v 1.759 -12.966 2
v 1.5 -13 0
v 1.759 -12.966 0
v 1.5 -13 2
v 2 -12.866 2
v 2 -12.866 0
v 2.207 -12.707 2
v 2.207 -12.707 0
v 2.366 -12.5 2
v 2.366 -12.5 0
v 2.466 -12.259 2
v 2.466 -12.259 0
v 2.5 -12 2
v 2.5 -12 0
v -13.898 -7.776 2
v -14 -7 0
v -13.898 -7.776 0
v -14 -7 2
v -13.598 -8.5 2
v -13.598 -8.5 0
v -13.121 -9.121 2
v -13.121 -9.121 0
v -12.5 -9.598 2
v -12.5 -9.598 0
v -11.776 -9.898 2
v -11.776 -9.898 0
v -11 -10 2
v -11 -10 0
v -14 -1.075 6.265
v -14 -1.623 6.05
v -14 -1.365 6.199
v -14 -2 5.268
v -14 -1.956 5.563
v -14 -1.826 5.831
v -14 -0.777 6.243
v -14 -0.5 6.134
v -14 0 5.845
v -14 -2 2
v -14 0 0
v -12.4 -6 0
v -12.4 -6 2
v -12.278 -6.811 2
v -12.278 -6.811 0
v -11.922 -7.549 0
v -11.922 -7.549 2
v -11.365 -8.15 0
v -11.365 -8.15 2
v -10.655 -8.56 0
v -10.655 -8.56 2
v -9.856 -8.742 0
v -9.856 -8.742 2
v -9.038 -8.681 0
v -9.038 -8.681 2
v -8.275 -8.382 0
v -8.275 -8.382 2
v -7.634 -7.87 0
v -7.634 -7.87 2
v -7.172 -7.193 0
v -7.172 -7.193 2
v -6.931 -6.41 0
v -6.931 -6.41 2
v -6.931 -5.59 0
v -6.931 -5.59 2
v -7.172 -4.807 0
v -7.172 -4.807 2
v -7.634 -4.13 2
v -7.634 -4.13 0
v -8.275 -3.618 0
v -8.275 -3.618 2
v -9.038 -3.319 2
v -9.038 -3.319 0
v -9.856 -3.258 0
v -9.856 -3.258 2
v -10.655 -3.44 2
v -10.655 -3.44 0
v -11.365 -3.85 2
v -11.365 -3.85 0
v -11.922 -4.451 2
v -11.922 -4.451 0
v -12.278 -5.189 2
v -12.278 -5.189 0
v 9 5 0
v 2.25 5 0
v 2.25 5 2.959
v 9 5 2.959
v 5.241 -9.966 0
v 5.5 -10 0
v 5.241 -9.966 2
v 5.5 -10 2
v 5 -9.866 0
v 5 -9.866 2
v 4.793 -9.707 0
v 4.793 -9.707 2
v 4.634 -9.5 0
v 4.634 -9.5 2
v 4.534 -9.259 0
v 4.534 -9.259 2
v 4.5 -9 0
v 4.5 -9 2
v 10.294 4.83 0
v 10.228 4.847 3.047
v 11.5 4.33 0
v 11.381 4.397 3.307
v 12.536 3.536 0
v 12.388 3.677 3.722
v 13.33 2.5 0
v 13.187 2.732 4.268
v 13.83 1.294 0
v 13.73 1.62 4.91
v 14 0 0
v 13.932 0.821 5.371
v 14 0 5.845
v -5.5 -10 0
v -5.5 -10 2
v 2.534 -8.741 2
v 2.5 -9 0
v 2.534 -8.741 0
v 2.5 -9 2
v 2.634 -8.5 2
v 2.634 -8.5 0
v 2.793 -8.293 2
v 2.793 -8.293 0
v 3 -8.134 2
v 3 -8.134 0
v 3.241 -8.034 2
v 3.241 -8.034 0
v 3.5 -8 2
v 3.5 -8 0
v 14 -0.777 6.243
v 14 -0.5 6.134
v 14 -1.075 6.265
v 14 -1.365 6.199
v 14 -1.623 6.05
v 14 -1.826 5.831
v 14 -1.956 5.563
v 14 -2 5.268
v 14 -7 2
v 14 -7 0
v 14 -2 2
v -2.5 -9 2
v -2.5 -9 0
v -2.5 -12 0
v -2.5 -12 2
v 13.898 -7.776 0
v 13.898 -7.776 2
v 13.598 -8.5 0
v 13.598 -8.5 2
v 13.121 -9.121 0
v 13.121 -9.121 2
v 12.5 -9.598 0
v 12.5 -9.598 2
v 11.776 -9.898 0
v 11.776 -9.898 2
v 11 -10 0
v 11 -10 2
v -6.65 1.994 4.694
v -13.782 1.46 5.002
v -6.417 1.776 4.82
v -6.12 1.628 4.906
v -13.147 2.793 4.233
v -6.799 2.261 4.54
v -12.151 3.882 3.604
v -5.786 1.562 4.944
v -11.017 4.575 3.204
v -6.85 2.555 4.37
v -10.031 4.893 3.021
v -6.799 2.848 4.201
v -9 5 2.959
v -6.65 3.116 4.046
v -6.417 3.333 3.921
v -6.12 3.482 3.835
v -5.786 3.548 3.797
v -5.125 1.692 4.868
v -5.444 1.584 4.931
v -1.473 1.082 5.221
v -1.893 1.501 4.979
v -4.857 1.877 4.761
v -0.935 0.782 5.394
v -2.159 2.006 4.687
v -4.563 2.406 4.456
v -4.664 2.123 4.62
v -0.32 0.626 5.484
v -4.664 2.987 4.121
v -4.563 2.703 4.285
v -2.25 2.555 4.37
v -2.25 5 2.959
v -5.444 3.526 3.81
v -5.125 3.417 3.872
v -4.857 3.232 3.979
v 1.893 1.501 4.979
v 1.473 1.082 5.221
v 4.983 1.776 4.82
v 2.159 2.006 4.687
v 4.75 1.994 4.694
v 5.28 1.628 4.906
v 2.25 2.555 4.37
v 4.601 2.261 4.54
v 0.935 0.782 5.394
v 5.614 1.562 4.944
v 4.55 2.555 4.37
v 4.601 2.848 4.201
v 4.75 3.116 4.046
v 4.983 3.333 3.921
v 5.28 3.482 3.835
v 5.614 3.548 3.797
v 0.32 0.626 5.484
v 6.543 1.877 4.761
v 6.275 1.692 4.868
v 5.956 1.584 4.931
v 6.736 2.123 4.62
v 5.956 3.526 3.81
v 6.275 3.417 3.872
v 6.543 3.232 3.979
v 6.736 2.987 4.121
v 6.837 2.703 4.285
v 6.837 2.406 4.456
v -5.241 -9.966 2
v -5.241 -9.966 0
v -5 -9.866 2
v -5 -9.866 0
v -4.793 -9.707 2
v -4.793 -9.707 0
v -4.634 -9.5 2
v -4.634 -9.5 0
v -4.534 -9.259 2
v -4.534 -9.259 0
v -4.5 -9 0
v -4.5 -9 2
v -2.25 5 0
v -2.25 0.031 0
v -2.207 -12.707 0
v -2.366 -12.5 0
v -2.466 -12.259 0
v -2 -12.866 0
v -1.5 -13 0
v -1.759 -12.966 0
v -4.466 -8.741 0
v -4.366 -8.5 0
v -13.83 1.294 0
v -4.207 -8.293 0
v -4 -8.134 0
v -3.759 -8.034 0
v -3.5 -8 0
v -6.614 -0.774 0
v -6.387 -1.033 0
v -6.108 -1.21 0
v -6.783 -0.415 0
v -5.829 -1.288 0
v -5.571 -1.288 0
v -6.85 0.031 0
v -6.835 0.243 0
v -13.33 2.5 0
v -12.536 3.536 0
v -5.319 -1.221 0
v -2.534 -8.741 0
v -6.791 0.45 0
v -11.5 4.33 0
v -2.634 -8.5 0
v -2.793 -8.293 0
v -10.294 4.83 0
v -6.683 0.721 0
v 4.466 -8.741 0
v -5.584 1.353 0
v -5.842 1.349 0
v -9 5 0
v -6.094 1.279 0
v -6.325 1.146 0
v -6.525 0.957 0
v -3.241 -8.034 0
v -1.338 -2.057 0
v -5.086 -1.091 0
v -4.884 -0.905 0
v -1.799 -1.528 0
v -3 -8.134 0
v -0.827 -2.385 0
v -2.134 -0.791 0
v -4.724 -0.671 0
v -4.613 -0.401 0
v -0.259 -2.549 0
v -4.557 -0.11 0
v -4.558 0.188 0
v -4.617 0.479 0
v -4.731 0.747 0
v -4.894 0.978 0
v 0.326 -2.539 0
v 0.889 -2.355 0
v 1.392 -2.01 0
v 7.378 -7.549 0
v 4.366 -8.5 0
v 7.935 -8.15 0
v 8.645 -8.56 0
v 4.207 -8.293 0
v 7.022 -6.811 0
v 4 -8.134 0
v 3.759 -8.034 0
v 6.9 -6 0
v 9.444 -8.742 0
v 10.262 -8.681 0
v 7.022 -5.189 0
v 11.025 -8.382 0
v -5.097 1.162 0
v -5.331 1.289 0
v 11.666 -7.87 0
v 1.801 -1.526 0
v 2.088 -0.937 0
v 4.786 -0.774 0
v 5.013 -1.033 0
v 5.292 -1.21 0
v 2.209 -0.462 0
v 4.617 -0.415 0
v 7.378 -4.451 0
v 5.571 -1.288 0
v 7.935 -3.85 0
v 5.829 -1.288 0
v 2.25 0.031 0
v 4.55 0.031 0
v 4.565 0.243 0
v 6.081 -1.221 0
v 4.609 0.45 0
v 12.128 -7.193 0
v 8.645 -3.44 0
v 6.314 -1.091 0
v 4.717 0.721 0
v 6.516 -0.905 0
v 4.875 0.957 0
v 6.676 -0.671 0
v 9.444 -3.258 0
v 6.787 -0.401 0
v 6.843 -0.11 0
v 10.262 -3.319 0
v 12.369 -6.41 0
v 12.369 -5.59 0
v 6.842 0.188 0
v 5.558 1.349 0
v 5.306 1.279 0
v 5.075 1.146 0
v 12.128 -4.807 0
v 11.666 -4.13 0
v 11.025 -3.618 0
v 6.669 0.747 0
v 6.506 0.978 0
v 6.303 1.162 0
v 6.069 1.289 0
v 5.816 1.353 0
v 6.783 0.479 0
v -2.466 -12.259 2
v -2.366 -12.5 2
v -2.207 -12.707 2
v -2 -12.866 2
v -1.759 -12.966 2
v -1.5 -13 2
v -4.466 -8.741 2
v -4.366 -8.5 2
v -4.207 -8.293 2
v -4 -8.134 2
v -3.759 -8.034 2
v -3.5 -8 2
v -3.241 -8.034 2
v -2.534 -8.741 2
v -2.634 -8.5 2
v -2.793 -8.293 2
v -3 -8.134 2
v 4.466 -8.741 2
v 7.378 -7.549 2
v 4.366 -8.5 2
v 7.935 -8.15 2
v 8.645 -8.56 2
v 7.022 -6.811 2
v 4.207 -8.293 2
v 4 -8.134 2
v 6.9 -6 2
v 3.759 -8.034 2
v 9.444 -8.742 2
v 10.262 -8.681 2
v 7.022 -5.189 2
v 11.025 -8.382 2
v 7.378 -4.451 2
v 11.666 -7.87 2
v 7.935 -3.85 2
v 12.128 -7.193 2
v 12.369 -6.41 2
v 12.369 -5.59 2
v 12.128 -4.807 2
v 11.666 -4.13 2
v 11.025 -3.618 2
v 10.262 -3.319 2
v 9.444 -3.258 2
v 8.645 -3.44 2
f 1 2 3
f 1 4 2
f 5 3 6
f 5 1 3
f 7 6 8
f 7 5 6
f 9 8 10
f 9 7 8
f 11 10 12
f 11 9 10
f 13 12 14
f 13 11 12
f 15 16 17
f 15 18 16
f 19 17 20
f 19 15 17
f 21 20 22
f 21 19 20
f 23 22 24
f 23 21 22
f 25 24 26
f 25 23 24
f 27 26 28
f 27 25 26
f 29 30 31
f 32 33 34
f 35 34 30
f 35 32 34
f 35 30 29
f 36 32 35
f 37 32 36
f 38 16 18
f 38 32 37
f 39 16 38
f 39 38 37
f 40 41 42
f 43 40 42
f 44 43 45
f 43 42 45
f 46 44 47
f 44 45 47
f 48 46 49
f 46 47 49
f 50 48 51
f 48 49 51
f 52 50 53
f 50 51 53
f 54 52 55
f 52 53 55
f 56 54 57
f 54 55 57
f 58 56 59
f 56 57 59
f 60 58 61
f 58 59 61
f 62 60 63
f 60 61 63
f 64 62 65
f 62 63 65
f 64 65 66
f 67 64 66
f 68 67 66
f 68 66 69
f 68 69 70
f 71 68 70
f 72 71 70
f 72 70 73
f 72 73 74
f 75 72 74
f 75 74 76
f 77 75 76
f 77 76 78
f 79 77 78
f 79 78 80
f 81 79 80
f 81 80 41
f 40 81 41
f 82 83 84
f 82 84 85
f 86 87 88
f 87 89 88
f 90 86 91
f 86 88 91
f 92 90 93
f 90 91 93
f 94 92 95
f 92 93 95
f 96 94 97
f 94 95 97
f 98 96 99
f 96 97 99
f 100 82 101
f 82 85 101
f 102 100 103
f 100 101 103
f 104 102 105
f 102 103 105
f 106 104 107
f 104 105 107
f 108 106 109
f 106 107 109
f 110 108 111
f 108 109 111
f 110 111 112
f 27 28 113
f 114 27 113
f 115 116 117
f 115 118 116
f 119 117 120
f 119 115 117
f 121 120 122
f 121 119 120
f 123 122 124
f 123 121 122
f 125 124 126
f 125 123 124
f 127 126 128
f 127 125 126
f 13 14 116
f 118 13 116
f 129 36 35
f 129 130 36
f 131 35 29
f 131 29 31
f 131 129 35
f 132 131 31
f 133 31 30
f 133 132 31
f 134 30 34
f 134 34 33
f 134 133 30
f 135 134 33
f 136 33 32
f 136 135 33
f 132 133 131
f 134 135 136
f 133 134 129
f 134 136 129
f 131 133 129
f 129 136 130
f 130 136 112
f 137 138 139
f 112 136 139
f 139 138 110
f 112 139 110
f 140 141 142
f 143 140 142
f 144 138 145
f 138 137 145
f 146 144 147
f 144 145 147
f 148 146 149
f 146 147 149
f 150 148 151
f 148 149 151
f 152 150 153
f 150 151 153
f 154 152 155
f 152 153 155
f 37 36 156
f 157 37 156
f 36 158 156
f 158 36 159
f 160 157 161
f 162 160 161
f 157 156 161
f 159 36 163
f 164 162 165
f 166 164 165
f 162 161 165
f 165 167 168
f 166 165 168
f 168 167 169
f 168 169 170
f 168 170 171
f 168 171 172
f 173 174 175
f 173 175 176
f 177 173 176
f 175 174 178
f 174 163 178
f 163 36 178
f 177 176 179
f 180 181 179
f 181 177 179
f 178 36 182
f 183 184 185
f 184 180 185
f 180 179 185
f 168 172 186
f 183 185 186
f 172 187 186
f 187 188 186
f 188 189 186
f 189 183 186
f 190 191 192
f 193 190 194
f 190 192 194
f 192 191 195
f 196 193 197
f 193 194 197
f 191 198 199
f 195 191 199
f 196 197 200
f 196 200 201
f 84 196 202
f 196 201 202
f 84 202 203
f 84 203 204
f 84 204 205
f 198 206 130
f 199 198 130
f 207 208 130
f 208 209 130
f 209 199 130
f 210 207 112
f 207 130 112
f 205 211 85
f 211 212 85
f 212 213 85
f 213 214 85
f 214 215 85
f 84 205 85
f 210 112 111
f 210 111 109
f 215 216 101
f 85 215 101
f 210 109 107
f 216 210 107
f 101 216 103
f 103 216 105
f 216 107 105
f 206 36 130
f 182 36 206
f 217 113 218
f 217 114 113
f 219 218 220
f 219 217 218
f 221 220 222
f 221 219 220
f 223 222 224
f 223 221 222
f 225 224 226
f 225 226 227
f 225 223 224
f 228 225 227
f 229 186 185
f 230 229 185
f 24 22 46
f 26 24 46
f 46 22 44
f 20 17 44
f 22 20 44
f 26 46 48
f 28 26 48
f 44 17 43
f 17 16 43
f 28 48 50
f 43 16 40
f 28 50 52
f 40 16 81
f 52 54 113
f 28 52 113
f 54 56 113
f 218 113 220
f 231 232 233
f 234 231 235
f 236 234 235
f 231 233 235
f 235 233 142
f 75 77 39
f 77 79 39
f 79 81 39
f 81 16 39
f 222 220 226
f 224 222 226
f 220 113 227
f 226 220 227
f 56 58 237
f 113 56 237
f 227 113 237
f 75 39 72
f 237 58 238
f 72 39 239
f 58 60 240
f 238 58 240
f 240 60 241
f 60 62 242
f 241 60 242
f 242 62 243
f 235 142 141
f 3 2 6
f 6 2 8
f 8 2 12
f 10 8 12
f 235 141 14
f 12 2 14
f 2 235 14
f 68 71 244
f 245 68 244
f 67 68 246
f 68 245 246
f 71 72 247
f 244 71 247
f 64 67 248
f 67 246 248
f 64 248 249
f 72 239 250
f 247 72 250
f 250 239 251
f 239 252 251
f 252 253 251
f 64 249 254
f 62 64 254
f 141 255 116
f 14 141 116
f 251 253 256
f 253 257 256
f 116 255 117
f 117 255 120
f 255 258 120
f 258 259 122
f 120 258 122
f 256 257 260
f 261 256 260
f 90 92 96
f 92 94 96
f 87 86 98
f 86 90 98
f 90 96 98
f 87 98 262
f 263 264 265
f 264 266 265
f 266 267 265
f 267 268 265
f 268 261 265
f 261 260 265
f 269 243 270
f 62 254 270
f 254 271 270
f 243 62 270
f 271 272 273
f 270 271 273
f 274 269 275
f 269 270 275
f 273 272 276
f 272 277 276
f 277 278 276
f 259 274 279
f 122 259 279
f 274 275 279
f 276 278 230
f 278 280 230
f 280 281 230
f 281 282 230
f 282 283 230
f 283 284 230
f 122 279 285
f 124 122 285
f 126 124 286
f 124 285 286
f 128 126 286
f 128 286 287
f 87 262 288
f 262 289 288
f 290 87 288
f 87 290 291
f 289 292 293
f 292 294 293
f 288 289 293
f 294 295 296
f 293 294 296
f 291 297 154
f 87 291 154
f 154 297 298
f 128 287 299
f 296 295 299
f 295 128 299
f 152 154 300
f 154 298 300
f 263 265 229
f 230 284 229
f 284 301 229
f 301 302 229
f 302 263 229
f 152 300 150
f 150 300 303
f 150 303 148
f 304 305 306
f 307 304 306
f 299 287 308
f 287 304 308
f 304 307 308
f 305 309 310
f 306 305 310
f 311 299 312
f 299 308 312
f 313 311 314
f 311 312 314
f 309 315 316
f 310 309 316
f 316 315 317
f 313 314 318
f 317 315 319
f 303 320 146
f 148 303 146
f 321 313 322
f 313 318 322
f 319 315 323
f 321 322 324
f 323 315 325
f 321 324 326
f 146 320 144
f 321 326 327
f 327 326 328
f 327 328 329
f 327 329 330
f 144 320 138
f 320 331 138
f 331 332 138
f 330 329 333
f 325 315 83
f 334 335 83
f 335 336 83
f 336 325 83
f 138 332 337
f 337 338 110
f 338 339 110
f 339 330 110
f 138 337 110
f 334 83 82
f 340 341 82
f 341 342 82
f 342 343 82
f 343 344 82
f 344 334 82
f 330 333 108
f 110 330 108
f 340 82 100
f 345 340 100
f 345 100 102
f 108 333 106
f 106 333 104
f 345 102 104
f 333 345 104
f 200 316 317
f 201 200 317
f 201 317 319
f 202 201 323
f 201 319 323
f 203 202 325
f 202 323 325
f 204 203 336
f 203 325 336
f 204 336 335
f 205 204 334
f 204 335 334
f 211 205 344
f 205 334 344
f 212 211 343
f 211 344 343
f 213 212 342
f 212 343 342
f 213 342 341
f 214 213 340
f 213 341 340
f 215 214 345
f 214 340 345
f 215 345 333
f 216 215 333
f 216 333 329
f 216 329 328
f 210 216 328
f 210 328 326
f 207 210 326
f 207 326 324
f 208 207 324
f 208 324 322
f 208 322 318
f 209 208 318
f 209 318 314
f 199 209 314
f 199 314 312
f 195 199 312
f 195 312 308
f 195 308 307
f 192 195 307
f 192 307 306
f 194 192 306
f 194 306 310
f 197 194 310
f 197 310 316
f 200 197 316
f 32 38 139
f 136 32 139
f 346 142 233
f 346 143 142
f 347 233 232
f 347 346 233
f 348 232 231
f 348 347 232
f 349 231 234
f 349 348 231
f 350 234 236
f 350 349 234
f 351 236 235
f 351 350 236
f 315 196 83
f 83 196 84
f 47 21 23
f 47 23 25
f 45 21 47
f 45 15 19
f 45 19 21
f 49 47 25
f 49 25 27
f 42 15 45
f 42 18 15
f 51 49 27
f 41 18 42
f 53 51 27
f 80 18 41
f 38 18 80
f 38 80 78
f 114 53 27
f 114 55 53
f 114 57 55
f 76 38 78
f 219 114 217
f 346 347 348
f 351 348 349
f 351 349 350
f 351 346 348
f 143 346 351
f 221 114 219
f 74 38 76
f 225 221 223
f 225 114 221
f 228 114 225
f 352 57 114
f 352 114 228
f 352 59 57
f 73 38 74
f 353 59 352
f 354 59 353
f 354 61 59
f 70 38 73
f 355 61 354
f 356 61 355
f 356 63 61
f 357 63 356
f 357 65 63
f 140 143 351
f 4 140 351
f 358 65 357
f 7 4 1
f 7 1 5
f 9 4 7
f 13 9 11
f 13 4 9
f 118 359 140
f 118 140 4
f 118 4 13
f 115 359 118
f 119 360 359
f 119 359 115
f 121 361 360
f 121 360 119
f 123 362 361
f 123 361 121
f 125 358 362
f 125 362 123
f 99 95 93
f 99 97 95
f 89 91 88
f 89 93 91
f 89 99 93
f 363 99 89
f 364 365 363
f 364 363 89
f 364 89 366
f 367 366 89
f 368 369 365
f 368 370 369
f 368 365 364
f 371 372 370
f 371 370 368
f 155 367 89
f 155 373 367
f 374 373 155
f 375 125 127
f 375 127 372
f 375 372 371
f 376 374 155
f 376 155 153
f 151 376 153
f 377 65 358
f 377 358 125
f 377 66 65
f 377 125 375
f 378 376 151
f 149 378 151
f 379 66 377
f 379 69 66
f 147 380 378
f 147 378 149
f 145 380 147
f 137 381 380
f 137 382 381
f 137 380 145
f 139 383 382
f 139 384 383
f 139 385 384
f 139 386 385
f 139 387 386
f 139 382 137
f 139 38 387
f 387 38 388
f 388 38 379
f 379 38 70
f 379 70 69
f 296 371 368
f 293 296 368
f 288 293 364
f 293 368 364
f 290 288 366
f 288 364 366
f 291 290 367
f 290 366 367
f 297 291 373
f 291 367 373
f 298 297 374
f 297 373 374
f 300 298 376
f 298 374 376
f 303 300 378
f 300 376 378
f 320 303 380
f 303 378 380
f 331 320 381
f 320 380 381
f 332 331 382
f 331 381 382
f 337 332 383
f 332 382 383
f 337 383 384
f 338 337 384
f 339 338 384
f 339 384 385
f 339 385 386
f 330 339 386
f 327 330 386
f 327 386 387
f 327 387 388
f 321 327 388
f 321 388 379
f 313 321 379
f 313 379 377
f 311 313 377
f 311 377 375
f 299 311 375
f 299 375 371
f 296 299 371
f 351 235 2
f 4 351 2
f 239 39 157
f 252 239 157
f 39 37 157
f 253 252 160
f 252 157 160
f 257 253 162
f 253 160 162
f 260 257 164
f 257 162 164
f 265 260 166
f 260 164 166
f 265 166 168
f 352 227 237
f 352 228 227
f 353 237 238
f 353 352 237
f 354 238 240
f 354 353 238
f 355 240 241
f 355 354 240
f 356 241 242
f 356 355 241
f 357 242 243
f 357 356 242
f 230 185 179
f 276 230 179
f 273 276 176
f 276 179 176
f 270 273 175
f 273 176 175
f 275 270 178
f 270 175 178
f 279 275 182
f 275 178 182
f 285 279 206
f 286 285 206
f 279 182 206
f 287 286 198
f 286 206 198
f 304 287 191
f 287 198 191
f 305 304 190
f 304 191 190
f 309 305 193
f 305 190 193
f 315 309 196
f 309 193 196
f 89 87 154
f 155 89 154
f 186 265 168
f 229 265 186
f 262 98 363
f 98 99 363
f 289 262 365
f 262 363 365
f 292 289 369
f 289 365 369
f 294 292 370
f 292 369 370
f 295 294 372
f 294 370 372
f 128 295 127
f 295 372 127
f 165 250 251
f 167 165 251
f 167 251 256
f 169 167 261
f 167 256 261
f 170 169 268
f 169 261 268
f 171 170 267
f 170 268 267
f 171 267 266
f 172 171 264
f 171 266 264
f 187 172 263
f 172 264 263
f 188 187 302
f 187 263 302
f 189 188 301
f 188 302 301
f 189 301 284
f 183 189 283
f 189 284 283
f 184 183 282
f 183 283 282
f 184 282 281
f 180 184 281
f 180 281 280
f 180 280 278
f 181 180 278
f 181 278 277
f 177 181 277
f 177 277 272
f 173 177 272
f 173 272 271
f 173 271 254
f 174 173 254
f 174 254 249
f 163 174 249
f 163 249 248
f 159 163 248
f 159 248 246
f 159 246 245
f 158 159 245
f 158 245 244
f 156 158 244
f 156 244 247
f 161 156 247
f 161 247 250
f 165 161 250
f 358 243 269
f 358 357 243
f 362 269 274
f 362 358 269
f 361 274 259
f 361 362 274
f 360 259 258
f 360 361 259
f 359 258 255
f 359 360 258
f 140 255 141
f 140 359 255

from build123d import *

# Parameters (mm, degrees)
F0_W      = 5
F0_H      = 3
F1_DEPTH  = 2
F0_W_2    = 28
F0_H_2    = 7
F2_DEPTH  = 7
F3_D      = 5.5
F5_DEPTH  = 28.001
F6_R      = 3
F7_R      = 5
F8_R      = 0.99999
F9_W      = 4.5
F9_H      = 3.1342408076
F10_DEPTH = 25
F11_D     = 2.3


# Not quite as in the source:
# - a fillet or chamfer is up to 0.001 mm smaller than in the source, because OpenCascade refuses the exact size


with BuildPart() as f1:
    # F0 (on Top) → F1 (new body)
    with BuildSketch(Plane.XY):
        Polygon((-14, -2), (-14, -10), (-4.5, -10), (-4.5, -8), (-2.5, -8), (-2.5, -10), (2.5, -10), (2.5, -8), (4.5, -8), (4.5, -10), (14, -10), (14, -2), align=None)
        with Locations((0, -11.5)):
            Rectangle(F0_W, F0_H)
    extrude(amount=F1_DEPTH)

    # F0 (on Top) → F2 (join)
    with BuildSketch(Plane.XY):
        with Locations((0, 1.5)):
            Rectangle(F0_W_2, F0_H_2)
    extrude(amount=F2_DEPTH)

    # F3 (through all)
    with Locations(Plane(origin=(0, 0, 0), x_dir=(1, 0, 0), z_dir=(0, 0, -1))):
        with Locations((-9.65, 6), (9.65, 6)):
            Hole(F3_D / 2)

    # F4 (on face) → F5 (cut, through all)
    with BuildSketch(Plane.YZ.offset(14)):
        Polygon((5, 7), (-2, 7), (5, 2.9585481157), align=None)
    extrude(amount=-F5_DEPTH, mode=Mode.SUBTRACT)

    # F6
    f6_edges = [f1.edges().sort_by_distance(p)[0] for p in [
        (-14, -10, 1),
        (14, -10, 1),
    ]]
    fillet(f6_edges, radius=F6_R)

    # F7
    f7_edges = [f1.edges().sort_by_distance(p)[0] for p in [
        (14, 5, 1.479274),
        (-14, 5, 1.479274),
    ]]
    fillet(f7_edges, radius=F7_R)

    # F8 (radius 1 in the source; OpenCascade refuses exactly that, so slightly less here)
    f8_edges = [f1.edges().sort_by_distance(p)[0] for p in [
        (0, -2, 7),
        (-4.5, -8, 1),
        (-2.5, -8, 1),
        (2.5, -8, 1),
        (4.5, -8, 1),
        (4.5, -10, 1),
        (-4.5, -10, 1),
        (-2.5, -13, 1),
        (2.5, -13, 1),
    ]]
    fillet(f8_edges, radius=F8_R)

    # F9 (on face) → F10 (cut)
    with BuildSketch(Plane(origin=(0, 2.5310889132, 4.3839745962), x_dir=(1, 0, 0), z_dir=(0, 0.5, 0.8660254038))):
        with BuildLine():
            Line((2.25, 2.8508529611), (-2.25, 2.8508529611))
            Line((-2.25, 2.8508529611), (-2.25, 0.0272258071))
            ThreePointArc((-2.25, 0.0272258071), (0, -2.2227741929), (2.25, 0.0272258071))
            Line((2.25, 0.0272258071), (2.25, 2.8508529611))
        make_face()
        with Locations((0, 4.4179733649)):
            Rectangle(F9_W, F9_H)
    extrude(amount=-F10_DEPTH, mode=Mode.SUBTRACT)

    # F11 (through all)
    with Locations(Plane(origin=(0, 2.5310889132, 4.3839745962), x_dir=(1, 0, 0), z_dir=(0, 0.5, 0.8660254038))):
        with Locations((5.7, 0.0272258071), (-5.7, 0.0272258071)):
            Hole(F11_D / 2)


solid = f1.part
